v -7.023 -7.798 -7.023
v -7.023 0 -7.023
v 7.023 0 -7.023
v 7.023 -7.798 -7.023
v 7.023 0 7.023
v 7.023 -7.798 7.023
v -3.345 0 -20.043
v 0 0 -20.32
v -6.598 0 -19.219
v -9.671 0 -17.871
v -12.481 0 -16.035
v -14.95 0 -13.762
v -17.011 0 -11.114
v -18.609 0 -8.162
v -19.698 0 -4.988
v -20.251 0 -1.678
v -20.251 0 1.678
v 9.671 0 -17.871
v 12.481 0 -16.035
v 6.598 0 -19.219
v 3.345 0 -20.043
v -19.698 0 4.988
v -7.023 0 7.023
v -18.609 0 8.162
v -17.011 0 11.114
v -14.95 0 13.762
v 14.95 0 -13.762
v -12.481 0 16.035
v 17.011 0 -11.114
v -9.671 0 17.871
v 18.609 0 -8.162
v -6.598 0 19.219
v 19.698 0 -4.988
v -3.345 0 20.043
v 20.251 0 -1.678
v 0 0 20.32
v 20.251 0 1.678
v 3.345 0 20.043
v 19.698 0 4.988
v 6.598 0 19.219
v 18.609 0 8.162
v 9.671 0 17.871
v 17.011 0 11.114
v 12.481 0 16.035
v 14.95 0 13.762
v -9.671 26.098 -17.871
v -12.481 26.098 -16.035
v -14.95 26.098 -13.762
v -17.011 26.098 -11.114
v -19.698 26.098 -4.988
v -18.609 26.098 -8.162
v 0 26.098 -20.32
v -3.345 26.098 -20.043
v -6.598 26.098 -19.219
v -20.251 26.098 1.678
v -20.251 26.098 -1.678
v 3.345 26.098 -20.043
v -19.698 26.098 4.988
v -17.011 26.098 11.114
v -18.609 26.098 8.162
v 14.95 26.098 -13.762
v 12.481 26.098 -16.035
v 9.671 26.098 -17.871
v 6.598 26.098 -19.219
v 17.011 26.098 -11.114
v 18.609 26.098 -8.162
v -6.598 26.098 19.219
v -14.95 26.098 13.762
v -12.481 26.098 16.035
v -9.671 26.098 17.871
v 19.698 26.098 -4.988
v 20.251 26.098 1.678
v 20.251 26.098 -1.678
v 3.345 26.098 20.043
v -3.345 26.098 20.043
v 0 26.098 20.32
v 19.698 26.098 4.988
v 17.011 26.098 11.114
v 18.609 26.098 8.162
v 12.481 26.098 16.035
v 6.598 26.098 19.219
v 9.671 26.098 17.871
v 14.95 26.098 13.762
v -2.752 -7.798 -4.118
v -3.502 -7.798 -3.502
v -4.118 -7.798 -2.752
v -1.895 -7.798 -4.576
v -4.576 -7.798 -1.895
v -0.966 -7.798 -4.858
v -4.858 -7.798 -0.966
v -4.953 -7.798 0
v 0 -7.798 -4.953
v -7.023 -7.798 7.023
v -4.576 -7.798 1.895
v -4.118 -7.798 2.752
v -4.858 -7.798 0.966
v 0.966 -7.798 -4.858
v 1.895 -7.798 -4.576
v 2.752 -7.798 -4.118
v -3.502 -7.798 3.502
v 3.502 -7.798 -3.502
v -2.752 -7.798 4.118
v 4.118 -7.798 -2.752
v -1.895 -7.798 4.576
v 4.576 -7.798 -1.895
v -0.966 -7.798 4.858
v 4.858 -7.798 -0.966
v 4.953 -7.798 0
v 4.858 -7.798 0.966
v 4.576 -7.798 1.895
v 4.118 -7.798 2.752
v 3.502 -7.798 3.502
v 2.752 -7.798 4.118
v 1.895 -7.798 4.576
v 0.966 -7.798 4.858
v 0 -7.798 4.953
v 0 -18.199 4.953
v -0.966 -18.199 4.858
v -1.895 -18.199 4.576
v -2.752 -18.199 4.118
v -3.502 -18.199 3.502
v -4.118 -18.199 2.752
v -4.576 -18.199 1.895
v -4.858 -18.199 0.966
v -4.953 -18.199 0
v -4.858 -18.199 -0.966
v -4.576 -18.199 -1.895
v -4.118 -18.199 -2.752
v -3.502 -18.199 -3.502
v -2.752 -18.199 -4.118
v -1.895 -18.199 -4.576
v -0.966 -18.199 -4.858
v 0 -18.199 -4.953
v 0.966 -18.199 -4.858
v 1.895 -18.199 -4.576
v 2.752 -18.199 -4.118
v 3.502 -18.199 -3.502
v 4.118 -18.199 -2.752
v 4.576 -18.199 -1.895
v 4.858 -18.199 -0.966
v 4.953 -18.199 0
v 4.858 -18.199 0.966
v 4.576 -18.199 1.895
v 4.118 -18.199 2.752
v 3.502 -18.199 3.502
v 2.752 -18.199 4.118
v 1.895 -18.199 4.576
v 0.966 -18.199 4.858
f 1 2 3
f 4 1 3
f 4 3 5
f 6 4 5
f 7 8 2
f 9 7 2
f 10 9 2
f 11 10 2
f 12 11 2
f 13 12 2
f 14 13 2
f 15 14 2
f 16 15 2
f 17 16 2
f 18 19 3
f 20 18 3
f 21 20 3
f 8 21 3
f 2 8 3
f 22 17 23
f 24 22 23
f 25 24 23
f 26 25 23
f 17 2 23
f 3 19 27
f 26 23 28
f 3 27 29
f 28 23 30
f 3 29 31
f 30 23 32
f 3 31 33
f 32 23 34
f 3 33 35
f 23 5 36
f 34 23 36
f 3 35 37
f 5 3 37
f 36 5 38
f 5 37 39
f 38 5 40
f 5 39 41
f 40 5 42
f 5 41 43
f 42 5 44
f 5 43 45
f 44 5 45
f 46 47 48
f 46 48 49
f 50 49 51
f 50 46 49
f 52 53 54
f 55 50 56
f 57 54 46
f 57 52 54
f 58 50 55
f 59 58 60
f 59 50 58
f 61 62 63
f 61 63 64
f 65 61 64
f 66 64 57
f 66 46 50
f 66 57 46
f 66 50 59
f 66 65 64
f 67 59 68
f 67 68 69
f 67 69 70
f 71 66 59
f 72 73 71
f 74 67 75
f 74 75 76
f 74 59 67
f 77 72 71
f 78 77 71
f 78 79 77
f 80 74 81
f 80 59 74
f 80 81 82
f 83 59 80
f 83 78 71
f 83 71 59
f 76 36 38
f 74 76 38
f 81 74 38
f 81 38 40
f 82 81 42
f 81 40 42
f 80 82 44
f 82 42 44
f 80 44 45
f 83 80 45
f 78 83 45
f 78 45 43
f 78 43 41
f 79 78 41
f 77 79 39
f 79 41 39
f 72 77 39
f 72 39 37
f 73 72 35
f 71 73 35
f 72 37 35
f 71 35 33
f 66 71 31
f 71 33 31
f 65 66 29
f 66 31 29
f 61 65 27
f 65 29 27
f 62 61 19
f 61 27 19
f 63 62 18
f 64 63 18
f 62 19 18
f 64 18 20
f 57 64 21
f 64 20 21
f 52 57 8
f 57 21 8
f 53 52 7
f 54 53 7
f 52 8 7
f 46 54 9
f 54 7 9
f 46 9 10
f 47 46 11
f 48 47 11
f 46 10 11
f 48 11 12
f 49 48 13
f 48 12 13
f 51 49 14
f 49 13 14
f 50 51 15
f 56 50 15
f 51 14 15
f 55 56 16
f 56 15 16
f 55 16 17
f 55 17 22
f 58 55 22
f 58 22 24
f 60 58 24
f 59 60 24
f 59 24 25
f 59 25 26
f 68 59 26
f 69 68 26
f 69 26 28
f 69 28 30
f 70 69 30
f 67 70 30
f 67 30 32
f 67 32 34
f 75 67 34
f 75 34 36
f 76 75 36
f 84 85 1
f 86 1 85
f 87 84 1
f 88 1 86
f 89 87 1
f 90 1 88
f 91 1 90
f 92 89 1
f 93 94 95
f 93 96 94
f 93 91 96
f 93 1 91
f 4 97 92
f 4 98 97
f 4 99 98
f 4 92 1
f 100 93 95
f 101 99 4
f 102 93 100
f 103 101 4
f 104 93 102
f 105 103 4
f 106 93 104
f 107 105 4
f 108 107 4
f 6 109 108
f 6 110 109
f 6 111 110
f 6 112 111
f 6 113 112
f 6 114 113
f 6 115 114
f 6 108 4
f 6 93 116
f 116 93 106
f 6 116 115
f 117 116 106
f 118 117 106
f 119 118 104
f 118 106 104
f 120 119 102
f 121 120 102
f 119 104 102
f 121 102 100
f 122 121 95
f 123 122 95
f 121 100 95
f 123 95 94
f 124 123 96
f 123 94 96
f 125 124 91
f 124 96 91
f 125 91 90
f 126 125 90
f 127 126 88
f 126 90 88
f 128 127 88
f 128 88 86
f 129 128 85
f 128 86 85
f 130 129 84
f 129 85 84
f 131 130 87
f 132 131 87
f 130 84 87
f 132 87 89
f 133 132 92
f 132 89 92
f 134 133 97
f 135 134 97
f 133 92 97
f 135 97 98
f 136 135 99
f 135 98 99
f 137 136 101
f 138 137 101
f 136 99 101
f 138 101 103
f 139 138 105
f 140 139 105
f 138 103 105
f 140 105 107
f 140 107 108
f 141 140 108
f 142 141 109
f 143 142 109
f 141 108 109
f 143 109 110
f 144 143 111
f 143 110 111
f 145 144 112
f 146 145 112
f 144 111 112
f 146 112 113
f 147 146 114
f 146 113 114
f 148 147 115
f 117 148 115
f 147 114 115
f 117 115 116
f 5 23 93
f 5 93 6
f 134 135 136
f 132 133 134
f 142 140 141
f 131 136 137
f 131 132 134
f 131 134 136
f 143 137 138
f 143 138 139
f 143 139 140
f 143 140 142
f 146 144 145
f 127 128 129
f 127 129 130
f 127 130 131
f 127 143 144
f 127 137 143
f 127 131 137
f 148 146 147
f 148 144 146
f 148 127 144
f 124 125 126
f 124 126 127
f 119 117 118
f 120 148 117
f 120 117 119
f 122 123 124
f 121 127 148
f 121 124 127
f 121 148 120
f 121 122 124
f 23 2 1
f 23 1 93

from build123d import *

# Parameters (mm, degrees)
SKETCH1_R           = 20.32
BOSS_EXTRUDE1_DEPTH = 26.0985
SKETCH2_W           = 14.0462
SKETCH2_H           = 14.0462
BOSS_EXTRUDE2_DEPTH = 7.7978
SKETCH3_R           = 4.953
BOSS_EXTRUDE3_DEPTH = 10.4013


with BuildPart() as part:
    # Sketch1 → Boss-Extrude1 (new body)
    with BuildSketch(Plane(origin=(0, 0, 0), x_dir=(1, 0, 0), z_dir=(0, 1, 0))):
        with Locations(Location((0, 0, 0), (0, 0, 270))):
            Circle(SKETCH1_R)
    extrude(amount=BOSS_EXTRUDE1_DEPTH)

    # Sketch2 → Boss-Extrude2 (add)
    with BuildSketch(Plane.XZ):
        Rectangle(SKETCH2_W, SKETCH2_H)
    extrude(amount=BOSS_EXTRUDE2_DEPTH)

    # Sketch3 → Boss-Extrude3 (add)
    with BuildSketch(Plane.XZ.offset(7.7978)):
        with Locations(Location((0, 0, 0), (0, 0, 90))):
            Circle(SKETCH3_R)
    extrude(amount=BOSS_EXTRUDE3_DEPTH)


solid = part.part
